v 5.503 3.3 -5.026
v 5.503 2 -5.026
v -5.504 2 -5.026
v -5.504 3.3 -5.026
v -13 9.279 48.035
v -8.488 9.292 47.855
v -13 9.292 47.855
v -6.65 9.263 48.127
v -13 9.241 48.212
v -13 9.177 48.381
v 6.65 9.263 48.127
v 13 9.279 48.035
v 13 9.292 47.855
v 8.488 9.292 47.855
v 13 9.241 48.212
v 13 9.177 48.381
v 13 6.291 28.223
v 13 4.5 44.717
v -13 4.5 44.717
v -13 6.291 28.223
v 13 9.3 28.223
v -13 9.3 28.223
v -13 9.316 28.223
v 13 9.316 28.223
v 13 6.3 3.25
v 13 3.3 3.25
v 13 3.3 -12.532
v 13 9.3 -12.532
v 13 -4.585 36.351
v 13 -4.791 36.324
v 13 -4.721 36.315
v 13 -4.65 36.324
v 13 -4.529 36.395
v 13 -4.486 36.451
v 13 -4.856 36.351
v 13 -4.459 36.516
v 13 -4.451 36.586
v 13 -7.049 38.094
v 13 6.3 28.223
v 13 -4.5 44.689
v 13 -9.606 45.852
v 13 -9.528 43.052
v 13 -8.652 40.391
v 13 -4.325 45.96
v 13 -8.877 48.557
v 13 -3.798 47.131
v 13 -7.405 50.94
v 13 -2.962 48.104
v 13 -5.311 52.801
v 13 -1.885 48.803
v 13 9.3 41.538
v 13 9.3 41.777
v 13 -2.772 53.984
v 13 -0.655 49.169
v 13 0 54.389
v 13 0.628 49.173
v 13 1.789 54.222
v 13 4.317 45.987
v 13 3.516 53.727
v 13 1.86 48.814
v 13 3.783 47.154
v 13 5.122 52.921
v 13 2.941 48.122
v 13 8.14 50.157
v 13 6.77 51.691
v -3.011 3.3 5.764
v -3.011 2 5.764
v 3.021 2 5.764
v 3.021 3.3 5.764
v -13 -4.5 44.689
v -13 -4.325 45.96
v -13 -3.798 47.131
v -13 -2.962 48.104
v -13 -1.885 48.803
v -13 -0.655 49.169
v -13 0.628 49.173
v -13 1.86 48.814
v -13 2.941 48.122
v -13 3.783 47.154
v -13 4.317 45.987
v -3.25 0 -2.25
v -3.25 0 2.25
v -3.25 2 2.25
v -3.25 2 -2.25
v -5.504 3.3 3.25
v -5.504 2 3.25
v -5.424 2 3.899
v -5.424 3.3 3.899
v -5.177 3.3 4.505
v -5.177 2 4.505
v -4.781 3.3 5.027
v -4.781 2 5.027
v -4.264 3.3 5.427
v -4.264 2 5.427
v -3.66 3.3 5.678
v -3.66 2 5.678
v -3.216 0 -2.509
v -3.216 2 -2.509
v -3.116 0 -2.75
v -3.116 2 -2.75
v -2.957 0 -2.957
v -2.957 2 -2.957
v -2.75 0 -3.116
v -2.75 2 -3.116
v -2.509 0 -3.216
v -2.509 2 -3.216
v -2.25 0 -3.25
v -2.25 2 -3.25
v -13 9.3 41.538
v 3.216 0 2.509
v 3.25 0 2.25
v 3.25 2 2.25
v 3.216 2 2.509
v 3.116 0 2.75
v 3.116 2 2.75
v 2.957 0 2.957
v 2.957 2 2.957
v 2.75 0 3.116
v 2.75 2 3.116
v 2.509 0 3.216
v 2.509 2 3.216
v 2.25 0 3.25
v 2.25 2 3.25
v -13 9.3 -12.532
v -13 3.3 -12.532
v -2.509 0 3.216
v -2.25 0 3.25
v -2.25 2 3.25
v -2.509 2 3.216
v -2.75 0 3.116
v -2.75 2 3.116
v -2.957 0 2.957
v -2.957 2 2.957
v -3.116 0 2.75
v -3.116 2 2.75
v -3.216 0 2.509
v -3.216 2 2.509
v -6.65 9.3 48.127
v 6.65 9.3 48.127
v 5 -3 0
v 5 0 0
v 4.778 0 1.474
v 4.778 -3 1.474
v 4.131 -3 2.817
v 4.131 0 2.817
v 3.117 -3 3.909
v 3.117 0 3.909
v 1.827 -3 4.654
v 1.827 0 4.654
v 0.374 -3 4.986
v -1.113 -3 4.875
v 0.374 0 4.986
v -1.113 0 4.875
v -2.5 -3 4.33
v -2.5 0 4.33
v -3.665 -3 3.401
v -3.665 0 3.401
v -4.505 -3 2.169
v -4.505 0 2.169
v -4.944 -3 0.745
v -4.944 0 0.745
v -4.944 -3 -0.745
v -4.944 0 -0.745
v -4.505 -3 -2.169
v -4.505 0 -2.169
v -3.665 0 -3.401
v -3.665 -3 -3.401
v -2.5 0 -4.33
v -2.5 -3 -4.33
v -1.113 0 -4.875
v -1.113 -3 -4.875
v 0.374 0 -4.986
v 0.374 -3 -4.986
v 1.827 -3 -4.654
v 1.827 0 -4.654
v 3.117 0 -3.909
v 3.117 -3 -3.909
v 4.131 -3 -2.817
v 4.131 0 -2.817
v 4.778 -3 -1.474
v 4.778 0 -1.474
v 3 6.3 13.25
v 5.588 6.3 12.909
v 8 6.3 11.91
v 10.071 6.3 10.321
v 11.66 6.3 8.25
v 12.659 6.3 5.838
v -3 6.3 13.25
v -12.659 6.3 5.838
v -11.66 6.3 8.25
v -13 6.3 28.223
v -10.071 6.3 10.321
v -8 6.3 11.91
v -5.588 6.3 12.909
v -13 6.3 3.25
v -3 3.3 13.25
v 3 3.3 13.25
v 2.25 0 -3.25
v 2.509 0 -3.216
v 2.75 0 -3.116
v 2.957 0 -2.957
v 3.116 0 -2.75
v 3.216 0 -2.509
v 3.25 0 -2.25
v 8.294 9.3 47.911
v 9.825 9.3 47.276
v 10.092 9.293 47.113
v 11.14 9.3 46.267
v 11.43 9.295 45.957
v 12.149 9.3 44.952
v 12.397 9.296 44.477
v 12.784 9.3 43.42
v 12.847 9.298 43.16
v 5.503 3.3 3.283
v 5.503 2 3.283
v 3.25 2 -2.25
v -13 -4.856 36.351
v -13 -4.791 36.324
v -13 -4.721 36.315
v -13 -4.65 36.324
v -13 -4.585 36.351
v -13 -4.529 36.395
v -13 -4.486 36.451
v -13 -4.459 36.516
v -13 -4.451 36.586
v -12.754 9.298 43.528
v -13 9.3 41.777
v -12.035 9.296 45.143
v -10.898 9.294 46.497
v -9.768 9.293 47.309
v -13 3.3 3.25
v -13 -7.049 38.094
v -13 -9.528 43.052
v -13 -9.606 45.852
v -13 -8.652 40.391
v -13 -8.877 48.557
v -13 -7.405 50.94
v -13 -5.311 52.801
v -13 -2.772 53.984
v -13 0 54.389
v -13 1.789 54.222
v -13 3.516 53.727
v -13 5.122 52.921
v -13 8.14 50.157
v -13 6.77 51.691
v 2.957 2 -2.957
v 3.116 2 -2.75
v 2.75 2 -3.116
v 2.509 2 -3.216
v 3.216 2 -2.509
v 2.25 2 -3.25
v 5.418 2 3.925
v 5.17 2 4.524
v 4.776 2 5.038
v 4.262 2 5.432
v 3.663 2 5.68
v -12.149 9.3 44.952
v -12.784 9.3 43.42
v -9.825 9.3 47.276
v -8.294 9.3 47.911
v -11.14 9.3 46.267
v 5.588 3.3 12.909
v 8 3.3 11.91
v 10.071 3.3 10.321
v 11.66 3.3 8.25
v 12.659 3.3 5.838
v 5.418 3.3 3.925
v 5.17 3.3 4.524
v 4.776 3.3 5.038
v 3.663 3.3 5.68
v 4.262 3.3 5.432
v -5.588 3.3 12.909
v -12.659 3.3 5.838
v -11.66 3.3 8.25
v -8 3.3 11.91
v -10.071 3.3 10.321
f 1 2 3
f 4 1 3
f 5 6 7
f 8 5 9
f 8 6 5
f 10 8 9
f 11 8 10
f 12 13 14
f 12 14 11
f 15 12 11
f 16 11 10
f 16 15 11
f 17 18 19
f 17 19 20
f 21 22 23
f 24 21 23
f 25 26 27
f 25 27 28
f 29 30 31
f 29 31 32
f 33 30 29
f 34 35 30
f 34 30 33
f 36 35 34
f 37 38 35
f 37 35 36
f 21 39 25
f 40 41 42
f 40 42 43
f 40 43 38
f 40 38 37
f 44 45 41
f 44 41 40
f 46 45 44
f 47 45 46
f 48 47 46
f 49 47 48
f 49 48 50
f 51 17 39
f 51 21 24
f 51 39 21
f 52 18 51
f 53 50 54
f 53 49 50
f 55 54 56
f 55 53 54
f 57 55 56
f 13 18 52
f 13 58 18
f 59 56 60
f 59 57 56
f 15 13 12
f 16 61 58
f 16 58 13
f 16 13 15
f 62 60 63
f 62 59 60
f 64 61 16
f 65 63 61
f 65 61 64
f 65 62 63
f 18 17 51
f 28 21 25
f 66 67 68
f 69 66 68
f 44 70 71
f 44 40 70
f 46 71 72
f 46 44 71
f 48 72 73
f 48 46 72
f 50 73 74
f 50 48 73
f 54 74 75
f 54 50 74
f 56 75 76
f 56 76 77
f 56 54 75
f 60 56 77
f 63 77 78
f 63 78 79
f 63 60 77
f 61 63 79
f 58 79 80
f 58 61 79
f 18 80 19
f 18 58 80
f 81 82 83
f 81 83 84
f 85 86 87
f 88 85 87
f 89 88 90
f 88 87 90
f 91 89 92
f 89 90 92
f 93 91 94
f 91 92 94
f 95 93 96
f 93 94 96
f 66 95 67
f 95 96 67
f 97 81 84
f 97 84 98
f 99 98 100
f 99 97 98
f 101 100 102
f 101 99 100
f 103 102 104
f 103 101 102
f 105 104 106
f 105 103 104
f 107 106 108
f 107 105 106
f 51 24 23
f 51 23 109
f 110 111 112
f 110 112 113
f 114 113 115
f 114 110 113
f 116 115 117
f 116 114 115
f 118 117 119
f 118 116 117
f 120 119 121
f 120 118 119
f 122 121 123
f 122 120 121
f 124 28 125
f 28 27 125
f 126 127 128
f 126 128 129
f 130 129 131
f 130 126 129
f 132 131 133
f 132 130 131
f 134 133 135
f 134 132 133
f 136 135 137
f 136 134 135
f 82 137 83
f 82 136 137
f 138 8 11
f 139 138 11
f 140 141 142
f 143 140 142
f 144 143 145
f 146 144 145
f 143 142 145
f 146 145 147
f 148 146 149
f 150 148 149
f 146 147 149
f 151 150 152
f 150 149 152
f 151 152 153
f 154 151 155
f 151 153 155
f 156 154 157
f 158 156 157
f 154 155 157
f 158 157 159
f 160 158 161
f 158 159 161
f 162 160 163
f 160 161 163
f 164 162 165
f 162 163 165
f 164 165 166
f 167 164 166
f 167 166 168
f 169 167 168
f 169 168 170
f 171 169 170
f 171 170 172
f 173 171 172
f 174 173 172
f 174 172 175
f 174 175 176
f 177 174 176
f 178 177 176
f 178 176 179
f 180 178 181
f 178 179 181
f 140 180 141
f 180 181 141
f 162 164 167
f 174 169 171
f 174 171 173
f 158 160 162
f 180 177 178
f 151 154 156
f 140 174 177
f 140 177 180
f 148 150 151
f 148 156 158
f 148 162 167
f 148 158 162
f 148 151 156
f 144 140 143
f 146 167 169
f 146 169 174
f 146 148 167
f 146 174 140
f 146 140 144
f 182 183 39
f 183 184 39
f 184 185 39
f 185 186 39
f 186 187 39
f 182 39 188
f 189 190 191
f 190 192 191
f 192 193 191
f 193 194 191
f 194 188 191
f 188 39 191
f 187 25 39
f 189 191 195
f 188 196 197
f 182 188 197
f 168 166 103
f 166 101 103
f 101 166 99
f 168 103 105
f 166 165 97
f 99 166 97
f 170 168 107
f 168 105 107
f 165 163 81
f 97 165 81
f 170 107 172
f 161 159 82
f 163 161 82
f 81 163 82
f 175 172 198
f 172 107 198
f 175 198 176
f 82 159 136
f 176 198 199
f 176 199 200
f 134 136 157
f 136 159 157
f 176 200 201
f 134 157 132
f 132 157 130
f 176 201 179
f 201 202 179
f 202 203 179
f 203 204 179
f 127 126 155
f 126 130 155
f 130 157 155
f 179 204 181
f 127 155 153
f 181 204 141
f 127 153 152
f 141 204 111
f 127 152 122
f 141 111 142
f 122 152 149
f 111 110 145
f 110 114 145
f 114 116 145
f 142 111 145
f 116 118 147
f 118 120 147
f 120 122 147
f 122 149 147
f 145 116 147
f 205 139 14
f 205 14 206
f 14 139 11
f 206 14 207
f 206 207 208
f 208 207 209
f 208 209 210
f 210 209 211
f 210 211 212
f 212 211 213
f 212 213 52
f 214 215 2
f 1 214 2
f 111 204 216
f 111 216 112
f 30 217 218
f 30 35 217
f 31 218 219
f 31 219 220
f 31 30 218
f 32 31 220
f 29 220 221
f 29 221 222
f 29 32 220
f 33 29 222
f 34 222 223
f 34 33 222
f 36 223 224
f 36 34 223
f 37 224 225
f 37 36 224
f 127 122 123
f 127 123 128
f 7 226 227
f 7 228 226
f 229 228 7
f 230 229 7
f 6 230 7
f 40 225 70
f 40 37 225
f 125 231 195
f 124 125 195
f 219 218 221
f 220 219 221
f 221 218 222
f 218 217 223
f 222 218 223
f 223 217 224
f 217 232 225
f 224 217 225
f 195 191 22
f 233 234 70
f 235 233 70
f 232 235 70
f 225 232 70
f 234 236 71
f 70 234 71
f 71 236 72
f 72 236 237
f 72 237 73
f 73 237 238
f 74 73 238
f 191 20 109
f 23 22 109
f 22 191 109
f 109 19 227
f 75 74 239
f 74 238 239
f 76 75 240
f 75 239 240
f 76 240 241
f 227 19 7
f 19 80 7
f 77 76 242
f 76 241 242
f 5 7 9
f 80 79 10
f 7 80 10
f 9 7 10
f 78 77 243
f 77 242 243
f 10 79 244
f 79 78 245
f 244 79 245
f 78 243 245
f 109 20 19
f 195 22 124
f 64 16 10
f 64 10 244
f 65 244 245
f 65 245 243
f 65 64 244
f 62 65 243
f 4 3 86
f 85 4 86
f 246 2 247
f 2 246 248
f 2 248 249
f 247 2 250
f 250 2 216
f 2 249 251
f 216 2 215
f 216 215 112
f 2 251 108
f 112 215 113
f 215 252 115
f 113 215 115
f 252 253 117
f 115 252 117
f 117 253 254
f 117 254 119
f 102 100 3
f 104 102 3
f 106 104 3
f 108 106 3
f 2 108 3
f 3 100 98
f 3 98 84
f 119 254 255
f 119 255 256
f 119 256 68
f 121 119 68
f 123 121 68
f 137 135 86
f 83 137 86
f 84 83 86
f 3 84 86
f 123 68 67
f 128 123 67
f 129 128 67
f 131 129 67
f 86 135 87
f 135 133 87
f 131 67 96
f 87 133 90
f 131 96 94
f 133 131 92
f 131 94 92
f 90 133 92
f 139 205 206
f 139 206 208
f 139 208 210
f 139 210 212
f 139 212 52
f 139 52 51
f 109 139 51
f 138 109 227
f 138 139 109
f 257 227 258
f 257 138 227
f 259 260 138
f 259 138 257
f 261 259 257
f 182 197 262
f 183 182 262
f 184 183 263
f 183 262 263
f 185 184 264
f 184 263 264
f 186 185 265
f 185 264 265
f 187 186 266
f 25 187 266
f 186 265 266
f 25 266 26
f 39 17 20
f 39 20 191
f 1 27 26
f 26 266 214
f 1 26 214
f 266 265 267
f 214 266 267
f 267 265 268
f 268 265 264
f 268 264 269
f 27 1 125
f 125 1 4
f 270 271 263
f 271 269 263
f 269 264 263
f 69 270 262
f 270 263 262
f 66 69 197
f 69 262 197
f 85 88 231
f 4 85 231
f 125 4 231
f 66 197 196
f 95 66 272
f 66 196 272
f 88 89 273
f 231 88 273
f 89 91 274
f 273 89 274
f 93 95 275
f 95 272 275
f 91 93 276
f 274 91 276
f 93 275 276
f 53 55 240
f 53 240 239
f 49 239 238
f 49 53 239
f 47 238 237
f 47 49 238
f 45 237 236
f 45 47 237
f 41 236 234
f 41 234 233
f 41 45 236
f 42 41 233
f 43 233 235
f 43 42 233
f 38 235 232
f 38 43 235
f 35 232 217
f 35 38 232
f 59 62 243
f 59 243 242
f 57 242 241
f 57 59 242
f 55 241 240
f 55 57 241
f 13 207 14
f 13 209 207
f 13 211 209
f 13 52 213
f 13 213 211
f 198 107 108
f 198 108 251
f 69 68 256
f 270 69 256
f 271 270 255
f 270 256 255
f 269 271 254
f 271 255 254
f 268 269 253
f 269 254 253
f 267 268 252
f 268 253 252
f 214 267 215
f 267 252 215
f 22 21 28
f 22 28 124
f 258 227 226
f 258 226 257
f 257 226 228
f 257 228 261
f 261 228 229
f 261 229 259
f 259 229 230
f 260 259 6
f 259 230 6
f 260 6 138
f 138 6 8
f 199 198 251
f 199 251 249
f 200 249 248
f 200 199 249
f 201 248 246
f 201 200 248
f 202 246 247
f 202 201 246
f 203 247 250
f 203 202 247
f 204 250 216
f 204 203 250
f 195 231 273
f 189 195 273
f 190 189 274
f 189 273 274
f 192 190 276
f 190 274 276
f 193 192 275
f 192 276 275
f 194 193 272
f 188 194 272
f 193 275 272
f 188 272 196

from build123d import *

# Parameters (mm, degrees)
F0_R      = 5
F1_DEPTH  = 3
F3_DEPTH  = 2
F6_DEPTH  = 1.3
F8_DEPTH  = 3
F10_DEPTH = 3
F12_DEPTH = 13


with BuildPart() as f1:
    # F0 (on Front) → F1 (new body)
    with BuildSketch(Plane.XZ):
        Circle(F0_R)
    extrude(amount=F1_DEPTH)

    # F2 (on Front) → F3 (join)
    with BuildSketch(Plane.XZ):
        with BuildLine():
            ThreePointArc((3.25, 2.25), (2.957107, 2.957107), (2.25, 3.25))
            Line((2.25, 3.25), (-2.25, 3.25))
            ThreePointArc((-2.25, 3.25), (-2.957107, 2.957107), (-3.25, 2.25))
            Line((-3.25, 2.25), (-3.25, -2.25))
            ThreePointArc((-3.25, -2.25), (-2.957107, -2.957107), (-2.25, -3.25))
            Line((-2.25, -3.25), (2.25, -3.25))
            ThreePointArc((2.25, -3.25), (2.957107, -2.957107), (3.25, -2.25))
            Line((3.25, -2.25), (3.25, 2.25))
        make_face()
    extrude(amount=-F3_DEPTH)

    # F5 (on face) → F6 (join)
    with BuildSketch(Plane(origin=(0, 2, 0), x_dir=(-1, 0, 0), z_dir=(0, 1, 0))):
        with BuildLine():
            Line((3.011181, 5.764368), (-3.021163, 5.764368))
            ThreePointArc((-3.021163, 5.764368), (-4.77577, 5.037585), (-5.502553, 3.282978))
            Line((-5.502553, 3.282978), (-5.502553, -5.026481))
            Line((-5.502553, -5.026481), (5.503863, -5.026481))
            Line((5.503863, -5.026481), (5.503863, 3.25))
            ThreePointArc((5.503863, 3.25), (4.781457, 5.0266), (3.011181, 5.764368))
        make_face()
    extrude(amount=F6_DEPTH)

    # F7 (on face) → F8 (join)
    with BuildSketch(Plane(origin=(0, 3.3, 0), x_dir=(-1, 0, 0), z_dir=(0, 1, 0))):
        with BuildLine():
            Line((3, 13.25), (0, 13.25))
            Line((0, 13.25), (-3, 13.25))
            ThreePointArc((-3, 13.25), (-10.071068, 10.321068), (-13, 3.25))
            Line((-13, 3.25), (-13, -12.532328))
            Line((-13, -12.532328), (0, -12.532328))
            Line((0, -12.532328), (13, -12.532328))
            Line((13, -12.532328), (13, 3.25))
            ThreePointArc((13, 3.25), (10.071068, 10.321068), (3, 13.25))
        make_face()
    extrude(amount=F8_DEPTH)

    # F9 (on face) → F10 (join)
    with BuildSketch(Plane(origin=(0, 6.3, 0), x_dir=(-1, 0, 0), z_dir=(0, 1, 0))):
        with BuildLine():
            Line((-13, 41.776921), (-13, -12.532328))
            Line((-13, -12.532328), (13, -12.532328))
            Line((13, -12.532328), (13, 41.776921))
            ThreePointArc((13, 41.776921), (11.140128, 46.267049), (6.65, 48.126921))
            Line((6.65, 48.126921), (-6.65, 48.126921))
            ThreePointArc((-6.65, 48.126921), (-11.140128, 46.267049), (-13, 41.776921))
        make_face()
    extrude(amount=F10_DEPTH)

    # F11 (on Right) → F12 (join, symmetric)
    with BuildSketch(Plane.YZ):
        with BuildLine():
            ThreePointArc((-4.499917, 44.689184), (-0.013706, 49.216576), (4.5, 44.716597))
            Line((4.5, 44.716597), (6.291118, 28.223049))
            Line((6.291118, 28.223049), (9.316304, 28.223049))
            Line((9.316304, 28.223049), (9.292265, 47.855158))
            ThreePointArc((9.292265, 47.855158), (9.263071, 48.124349), (9.177474, 48.381234))
            ThreePointArc((9.177474, 48.381234), (7.493667, 50.958381), (5.122331, 52.921456))
            ThreePointArc((5.122331, 52.921456), (2.657907, 53.992931), (0, 54.389135))
            ThreePointArc((0, 54.389135), (-9.339994, 47.231055), (-4.856021, 36.351367))
            ThreePointArc((-4.856021, 36.351367), (-4.585088, 36.351301), (-4.450556, 36.586473))
            Line((-4.450556, 36.586473), (-4.499917, 44.689184))
        make_face()
        with BuildLine():
            ThreePointArc((5.122331, 52.921456), (2.664224, 54.014979), (0, 54.389135))
            ThreePointArc((0, 54.389135), (2.657907, 53.992931), (5.122331, 52.921456))
        make_face()
    extrude(amount=F12_DEPTH, both=True)


solid = f1.part
